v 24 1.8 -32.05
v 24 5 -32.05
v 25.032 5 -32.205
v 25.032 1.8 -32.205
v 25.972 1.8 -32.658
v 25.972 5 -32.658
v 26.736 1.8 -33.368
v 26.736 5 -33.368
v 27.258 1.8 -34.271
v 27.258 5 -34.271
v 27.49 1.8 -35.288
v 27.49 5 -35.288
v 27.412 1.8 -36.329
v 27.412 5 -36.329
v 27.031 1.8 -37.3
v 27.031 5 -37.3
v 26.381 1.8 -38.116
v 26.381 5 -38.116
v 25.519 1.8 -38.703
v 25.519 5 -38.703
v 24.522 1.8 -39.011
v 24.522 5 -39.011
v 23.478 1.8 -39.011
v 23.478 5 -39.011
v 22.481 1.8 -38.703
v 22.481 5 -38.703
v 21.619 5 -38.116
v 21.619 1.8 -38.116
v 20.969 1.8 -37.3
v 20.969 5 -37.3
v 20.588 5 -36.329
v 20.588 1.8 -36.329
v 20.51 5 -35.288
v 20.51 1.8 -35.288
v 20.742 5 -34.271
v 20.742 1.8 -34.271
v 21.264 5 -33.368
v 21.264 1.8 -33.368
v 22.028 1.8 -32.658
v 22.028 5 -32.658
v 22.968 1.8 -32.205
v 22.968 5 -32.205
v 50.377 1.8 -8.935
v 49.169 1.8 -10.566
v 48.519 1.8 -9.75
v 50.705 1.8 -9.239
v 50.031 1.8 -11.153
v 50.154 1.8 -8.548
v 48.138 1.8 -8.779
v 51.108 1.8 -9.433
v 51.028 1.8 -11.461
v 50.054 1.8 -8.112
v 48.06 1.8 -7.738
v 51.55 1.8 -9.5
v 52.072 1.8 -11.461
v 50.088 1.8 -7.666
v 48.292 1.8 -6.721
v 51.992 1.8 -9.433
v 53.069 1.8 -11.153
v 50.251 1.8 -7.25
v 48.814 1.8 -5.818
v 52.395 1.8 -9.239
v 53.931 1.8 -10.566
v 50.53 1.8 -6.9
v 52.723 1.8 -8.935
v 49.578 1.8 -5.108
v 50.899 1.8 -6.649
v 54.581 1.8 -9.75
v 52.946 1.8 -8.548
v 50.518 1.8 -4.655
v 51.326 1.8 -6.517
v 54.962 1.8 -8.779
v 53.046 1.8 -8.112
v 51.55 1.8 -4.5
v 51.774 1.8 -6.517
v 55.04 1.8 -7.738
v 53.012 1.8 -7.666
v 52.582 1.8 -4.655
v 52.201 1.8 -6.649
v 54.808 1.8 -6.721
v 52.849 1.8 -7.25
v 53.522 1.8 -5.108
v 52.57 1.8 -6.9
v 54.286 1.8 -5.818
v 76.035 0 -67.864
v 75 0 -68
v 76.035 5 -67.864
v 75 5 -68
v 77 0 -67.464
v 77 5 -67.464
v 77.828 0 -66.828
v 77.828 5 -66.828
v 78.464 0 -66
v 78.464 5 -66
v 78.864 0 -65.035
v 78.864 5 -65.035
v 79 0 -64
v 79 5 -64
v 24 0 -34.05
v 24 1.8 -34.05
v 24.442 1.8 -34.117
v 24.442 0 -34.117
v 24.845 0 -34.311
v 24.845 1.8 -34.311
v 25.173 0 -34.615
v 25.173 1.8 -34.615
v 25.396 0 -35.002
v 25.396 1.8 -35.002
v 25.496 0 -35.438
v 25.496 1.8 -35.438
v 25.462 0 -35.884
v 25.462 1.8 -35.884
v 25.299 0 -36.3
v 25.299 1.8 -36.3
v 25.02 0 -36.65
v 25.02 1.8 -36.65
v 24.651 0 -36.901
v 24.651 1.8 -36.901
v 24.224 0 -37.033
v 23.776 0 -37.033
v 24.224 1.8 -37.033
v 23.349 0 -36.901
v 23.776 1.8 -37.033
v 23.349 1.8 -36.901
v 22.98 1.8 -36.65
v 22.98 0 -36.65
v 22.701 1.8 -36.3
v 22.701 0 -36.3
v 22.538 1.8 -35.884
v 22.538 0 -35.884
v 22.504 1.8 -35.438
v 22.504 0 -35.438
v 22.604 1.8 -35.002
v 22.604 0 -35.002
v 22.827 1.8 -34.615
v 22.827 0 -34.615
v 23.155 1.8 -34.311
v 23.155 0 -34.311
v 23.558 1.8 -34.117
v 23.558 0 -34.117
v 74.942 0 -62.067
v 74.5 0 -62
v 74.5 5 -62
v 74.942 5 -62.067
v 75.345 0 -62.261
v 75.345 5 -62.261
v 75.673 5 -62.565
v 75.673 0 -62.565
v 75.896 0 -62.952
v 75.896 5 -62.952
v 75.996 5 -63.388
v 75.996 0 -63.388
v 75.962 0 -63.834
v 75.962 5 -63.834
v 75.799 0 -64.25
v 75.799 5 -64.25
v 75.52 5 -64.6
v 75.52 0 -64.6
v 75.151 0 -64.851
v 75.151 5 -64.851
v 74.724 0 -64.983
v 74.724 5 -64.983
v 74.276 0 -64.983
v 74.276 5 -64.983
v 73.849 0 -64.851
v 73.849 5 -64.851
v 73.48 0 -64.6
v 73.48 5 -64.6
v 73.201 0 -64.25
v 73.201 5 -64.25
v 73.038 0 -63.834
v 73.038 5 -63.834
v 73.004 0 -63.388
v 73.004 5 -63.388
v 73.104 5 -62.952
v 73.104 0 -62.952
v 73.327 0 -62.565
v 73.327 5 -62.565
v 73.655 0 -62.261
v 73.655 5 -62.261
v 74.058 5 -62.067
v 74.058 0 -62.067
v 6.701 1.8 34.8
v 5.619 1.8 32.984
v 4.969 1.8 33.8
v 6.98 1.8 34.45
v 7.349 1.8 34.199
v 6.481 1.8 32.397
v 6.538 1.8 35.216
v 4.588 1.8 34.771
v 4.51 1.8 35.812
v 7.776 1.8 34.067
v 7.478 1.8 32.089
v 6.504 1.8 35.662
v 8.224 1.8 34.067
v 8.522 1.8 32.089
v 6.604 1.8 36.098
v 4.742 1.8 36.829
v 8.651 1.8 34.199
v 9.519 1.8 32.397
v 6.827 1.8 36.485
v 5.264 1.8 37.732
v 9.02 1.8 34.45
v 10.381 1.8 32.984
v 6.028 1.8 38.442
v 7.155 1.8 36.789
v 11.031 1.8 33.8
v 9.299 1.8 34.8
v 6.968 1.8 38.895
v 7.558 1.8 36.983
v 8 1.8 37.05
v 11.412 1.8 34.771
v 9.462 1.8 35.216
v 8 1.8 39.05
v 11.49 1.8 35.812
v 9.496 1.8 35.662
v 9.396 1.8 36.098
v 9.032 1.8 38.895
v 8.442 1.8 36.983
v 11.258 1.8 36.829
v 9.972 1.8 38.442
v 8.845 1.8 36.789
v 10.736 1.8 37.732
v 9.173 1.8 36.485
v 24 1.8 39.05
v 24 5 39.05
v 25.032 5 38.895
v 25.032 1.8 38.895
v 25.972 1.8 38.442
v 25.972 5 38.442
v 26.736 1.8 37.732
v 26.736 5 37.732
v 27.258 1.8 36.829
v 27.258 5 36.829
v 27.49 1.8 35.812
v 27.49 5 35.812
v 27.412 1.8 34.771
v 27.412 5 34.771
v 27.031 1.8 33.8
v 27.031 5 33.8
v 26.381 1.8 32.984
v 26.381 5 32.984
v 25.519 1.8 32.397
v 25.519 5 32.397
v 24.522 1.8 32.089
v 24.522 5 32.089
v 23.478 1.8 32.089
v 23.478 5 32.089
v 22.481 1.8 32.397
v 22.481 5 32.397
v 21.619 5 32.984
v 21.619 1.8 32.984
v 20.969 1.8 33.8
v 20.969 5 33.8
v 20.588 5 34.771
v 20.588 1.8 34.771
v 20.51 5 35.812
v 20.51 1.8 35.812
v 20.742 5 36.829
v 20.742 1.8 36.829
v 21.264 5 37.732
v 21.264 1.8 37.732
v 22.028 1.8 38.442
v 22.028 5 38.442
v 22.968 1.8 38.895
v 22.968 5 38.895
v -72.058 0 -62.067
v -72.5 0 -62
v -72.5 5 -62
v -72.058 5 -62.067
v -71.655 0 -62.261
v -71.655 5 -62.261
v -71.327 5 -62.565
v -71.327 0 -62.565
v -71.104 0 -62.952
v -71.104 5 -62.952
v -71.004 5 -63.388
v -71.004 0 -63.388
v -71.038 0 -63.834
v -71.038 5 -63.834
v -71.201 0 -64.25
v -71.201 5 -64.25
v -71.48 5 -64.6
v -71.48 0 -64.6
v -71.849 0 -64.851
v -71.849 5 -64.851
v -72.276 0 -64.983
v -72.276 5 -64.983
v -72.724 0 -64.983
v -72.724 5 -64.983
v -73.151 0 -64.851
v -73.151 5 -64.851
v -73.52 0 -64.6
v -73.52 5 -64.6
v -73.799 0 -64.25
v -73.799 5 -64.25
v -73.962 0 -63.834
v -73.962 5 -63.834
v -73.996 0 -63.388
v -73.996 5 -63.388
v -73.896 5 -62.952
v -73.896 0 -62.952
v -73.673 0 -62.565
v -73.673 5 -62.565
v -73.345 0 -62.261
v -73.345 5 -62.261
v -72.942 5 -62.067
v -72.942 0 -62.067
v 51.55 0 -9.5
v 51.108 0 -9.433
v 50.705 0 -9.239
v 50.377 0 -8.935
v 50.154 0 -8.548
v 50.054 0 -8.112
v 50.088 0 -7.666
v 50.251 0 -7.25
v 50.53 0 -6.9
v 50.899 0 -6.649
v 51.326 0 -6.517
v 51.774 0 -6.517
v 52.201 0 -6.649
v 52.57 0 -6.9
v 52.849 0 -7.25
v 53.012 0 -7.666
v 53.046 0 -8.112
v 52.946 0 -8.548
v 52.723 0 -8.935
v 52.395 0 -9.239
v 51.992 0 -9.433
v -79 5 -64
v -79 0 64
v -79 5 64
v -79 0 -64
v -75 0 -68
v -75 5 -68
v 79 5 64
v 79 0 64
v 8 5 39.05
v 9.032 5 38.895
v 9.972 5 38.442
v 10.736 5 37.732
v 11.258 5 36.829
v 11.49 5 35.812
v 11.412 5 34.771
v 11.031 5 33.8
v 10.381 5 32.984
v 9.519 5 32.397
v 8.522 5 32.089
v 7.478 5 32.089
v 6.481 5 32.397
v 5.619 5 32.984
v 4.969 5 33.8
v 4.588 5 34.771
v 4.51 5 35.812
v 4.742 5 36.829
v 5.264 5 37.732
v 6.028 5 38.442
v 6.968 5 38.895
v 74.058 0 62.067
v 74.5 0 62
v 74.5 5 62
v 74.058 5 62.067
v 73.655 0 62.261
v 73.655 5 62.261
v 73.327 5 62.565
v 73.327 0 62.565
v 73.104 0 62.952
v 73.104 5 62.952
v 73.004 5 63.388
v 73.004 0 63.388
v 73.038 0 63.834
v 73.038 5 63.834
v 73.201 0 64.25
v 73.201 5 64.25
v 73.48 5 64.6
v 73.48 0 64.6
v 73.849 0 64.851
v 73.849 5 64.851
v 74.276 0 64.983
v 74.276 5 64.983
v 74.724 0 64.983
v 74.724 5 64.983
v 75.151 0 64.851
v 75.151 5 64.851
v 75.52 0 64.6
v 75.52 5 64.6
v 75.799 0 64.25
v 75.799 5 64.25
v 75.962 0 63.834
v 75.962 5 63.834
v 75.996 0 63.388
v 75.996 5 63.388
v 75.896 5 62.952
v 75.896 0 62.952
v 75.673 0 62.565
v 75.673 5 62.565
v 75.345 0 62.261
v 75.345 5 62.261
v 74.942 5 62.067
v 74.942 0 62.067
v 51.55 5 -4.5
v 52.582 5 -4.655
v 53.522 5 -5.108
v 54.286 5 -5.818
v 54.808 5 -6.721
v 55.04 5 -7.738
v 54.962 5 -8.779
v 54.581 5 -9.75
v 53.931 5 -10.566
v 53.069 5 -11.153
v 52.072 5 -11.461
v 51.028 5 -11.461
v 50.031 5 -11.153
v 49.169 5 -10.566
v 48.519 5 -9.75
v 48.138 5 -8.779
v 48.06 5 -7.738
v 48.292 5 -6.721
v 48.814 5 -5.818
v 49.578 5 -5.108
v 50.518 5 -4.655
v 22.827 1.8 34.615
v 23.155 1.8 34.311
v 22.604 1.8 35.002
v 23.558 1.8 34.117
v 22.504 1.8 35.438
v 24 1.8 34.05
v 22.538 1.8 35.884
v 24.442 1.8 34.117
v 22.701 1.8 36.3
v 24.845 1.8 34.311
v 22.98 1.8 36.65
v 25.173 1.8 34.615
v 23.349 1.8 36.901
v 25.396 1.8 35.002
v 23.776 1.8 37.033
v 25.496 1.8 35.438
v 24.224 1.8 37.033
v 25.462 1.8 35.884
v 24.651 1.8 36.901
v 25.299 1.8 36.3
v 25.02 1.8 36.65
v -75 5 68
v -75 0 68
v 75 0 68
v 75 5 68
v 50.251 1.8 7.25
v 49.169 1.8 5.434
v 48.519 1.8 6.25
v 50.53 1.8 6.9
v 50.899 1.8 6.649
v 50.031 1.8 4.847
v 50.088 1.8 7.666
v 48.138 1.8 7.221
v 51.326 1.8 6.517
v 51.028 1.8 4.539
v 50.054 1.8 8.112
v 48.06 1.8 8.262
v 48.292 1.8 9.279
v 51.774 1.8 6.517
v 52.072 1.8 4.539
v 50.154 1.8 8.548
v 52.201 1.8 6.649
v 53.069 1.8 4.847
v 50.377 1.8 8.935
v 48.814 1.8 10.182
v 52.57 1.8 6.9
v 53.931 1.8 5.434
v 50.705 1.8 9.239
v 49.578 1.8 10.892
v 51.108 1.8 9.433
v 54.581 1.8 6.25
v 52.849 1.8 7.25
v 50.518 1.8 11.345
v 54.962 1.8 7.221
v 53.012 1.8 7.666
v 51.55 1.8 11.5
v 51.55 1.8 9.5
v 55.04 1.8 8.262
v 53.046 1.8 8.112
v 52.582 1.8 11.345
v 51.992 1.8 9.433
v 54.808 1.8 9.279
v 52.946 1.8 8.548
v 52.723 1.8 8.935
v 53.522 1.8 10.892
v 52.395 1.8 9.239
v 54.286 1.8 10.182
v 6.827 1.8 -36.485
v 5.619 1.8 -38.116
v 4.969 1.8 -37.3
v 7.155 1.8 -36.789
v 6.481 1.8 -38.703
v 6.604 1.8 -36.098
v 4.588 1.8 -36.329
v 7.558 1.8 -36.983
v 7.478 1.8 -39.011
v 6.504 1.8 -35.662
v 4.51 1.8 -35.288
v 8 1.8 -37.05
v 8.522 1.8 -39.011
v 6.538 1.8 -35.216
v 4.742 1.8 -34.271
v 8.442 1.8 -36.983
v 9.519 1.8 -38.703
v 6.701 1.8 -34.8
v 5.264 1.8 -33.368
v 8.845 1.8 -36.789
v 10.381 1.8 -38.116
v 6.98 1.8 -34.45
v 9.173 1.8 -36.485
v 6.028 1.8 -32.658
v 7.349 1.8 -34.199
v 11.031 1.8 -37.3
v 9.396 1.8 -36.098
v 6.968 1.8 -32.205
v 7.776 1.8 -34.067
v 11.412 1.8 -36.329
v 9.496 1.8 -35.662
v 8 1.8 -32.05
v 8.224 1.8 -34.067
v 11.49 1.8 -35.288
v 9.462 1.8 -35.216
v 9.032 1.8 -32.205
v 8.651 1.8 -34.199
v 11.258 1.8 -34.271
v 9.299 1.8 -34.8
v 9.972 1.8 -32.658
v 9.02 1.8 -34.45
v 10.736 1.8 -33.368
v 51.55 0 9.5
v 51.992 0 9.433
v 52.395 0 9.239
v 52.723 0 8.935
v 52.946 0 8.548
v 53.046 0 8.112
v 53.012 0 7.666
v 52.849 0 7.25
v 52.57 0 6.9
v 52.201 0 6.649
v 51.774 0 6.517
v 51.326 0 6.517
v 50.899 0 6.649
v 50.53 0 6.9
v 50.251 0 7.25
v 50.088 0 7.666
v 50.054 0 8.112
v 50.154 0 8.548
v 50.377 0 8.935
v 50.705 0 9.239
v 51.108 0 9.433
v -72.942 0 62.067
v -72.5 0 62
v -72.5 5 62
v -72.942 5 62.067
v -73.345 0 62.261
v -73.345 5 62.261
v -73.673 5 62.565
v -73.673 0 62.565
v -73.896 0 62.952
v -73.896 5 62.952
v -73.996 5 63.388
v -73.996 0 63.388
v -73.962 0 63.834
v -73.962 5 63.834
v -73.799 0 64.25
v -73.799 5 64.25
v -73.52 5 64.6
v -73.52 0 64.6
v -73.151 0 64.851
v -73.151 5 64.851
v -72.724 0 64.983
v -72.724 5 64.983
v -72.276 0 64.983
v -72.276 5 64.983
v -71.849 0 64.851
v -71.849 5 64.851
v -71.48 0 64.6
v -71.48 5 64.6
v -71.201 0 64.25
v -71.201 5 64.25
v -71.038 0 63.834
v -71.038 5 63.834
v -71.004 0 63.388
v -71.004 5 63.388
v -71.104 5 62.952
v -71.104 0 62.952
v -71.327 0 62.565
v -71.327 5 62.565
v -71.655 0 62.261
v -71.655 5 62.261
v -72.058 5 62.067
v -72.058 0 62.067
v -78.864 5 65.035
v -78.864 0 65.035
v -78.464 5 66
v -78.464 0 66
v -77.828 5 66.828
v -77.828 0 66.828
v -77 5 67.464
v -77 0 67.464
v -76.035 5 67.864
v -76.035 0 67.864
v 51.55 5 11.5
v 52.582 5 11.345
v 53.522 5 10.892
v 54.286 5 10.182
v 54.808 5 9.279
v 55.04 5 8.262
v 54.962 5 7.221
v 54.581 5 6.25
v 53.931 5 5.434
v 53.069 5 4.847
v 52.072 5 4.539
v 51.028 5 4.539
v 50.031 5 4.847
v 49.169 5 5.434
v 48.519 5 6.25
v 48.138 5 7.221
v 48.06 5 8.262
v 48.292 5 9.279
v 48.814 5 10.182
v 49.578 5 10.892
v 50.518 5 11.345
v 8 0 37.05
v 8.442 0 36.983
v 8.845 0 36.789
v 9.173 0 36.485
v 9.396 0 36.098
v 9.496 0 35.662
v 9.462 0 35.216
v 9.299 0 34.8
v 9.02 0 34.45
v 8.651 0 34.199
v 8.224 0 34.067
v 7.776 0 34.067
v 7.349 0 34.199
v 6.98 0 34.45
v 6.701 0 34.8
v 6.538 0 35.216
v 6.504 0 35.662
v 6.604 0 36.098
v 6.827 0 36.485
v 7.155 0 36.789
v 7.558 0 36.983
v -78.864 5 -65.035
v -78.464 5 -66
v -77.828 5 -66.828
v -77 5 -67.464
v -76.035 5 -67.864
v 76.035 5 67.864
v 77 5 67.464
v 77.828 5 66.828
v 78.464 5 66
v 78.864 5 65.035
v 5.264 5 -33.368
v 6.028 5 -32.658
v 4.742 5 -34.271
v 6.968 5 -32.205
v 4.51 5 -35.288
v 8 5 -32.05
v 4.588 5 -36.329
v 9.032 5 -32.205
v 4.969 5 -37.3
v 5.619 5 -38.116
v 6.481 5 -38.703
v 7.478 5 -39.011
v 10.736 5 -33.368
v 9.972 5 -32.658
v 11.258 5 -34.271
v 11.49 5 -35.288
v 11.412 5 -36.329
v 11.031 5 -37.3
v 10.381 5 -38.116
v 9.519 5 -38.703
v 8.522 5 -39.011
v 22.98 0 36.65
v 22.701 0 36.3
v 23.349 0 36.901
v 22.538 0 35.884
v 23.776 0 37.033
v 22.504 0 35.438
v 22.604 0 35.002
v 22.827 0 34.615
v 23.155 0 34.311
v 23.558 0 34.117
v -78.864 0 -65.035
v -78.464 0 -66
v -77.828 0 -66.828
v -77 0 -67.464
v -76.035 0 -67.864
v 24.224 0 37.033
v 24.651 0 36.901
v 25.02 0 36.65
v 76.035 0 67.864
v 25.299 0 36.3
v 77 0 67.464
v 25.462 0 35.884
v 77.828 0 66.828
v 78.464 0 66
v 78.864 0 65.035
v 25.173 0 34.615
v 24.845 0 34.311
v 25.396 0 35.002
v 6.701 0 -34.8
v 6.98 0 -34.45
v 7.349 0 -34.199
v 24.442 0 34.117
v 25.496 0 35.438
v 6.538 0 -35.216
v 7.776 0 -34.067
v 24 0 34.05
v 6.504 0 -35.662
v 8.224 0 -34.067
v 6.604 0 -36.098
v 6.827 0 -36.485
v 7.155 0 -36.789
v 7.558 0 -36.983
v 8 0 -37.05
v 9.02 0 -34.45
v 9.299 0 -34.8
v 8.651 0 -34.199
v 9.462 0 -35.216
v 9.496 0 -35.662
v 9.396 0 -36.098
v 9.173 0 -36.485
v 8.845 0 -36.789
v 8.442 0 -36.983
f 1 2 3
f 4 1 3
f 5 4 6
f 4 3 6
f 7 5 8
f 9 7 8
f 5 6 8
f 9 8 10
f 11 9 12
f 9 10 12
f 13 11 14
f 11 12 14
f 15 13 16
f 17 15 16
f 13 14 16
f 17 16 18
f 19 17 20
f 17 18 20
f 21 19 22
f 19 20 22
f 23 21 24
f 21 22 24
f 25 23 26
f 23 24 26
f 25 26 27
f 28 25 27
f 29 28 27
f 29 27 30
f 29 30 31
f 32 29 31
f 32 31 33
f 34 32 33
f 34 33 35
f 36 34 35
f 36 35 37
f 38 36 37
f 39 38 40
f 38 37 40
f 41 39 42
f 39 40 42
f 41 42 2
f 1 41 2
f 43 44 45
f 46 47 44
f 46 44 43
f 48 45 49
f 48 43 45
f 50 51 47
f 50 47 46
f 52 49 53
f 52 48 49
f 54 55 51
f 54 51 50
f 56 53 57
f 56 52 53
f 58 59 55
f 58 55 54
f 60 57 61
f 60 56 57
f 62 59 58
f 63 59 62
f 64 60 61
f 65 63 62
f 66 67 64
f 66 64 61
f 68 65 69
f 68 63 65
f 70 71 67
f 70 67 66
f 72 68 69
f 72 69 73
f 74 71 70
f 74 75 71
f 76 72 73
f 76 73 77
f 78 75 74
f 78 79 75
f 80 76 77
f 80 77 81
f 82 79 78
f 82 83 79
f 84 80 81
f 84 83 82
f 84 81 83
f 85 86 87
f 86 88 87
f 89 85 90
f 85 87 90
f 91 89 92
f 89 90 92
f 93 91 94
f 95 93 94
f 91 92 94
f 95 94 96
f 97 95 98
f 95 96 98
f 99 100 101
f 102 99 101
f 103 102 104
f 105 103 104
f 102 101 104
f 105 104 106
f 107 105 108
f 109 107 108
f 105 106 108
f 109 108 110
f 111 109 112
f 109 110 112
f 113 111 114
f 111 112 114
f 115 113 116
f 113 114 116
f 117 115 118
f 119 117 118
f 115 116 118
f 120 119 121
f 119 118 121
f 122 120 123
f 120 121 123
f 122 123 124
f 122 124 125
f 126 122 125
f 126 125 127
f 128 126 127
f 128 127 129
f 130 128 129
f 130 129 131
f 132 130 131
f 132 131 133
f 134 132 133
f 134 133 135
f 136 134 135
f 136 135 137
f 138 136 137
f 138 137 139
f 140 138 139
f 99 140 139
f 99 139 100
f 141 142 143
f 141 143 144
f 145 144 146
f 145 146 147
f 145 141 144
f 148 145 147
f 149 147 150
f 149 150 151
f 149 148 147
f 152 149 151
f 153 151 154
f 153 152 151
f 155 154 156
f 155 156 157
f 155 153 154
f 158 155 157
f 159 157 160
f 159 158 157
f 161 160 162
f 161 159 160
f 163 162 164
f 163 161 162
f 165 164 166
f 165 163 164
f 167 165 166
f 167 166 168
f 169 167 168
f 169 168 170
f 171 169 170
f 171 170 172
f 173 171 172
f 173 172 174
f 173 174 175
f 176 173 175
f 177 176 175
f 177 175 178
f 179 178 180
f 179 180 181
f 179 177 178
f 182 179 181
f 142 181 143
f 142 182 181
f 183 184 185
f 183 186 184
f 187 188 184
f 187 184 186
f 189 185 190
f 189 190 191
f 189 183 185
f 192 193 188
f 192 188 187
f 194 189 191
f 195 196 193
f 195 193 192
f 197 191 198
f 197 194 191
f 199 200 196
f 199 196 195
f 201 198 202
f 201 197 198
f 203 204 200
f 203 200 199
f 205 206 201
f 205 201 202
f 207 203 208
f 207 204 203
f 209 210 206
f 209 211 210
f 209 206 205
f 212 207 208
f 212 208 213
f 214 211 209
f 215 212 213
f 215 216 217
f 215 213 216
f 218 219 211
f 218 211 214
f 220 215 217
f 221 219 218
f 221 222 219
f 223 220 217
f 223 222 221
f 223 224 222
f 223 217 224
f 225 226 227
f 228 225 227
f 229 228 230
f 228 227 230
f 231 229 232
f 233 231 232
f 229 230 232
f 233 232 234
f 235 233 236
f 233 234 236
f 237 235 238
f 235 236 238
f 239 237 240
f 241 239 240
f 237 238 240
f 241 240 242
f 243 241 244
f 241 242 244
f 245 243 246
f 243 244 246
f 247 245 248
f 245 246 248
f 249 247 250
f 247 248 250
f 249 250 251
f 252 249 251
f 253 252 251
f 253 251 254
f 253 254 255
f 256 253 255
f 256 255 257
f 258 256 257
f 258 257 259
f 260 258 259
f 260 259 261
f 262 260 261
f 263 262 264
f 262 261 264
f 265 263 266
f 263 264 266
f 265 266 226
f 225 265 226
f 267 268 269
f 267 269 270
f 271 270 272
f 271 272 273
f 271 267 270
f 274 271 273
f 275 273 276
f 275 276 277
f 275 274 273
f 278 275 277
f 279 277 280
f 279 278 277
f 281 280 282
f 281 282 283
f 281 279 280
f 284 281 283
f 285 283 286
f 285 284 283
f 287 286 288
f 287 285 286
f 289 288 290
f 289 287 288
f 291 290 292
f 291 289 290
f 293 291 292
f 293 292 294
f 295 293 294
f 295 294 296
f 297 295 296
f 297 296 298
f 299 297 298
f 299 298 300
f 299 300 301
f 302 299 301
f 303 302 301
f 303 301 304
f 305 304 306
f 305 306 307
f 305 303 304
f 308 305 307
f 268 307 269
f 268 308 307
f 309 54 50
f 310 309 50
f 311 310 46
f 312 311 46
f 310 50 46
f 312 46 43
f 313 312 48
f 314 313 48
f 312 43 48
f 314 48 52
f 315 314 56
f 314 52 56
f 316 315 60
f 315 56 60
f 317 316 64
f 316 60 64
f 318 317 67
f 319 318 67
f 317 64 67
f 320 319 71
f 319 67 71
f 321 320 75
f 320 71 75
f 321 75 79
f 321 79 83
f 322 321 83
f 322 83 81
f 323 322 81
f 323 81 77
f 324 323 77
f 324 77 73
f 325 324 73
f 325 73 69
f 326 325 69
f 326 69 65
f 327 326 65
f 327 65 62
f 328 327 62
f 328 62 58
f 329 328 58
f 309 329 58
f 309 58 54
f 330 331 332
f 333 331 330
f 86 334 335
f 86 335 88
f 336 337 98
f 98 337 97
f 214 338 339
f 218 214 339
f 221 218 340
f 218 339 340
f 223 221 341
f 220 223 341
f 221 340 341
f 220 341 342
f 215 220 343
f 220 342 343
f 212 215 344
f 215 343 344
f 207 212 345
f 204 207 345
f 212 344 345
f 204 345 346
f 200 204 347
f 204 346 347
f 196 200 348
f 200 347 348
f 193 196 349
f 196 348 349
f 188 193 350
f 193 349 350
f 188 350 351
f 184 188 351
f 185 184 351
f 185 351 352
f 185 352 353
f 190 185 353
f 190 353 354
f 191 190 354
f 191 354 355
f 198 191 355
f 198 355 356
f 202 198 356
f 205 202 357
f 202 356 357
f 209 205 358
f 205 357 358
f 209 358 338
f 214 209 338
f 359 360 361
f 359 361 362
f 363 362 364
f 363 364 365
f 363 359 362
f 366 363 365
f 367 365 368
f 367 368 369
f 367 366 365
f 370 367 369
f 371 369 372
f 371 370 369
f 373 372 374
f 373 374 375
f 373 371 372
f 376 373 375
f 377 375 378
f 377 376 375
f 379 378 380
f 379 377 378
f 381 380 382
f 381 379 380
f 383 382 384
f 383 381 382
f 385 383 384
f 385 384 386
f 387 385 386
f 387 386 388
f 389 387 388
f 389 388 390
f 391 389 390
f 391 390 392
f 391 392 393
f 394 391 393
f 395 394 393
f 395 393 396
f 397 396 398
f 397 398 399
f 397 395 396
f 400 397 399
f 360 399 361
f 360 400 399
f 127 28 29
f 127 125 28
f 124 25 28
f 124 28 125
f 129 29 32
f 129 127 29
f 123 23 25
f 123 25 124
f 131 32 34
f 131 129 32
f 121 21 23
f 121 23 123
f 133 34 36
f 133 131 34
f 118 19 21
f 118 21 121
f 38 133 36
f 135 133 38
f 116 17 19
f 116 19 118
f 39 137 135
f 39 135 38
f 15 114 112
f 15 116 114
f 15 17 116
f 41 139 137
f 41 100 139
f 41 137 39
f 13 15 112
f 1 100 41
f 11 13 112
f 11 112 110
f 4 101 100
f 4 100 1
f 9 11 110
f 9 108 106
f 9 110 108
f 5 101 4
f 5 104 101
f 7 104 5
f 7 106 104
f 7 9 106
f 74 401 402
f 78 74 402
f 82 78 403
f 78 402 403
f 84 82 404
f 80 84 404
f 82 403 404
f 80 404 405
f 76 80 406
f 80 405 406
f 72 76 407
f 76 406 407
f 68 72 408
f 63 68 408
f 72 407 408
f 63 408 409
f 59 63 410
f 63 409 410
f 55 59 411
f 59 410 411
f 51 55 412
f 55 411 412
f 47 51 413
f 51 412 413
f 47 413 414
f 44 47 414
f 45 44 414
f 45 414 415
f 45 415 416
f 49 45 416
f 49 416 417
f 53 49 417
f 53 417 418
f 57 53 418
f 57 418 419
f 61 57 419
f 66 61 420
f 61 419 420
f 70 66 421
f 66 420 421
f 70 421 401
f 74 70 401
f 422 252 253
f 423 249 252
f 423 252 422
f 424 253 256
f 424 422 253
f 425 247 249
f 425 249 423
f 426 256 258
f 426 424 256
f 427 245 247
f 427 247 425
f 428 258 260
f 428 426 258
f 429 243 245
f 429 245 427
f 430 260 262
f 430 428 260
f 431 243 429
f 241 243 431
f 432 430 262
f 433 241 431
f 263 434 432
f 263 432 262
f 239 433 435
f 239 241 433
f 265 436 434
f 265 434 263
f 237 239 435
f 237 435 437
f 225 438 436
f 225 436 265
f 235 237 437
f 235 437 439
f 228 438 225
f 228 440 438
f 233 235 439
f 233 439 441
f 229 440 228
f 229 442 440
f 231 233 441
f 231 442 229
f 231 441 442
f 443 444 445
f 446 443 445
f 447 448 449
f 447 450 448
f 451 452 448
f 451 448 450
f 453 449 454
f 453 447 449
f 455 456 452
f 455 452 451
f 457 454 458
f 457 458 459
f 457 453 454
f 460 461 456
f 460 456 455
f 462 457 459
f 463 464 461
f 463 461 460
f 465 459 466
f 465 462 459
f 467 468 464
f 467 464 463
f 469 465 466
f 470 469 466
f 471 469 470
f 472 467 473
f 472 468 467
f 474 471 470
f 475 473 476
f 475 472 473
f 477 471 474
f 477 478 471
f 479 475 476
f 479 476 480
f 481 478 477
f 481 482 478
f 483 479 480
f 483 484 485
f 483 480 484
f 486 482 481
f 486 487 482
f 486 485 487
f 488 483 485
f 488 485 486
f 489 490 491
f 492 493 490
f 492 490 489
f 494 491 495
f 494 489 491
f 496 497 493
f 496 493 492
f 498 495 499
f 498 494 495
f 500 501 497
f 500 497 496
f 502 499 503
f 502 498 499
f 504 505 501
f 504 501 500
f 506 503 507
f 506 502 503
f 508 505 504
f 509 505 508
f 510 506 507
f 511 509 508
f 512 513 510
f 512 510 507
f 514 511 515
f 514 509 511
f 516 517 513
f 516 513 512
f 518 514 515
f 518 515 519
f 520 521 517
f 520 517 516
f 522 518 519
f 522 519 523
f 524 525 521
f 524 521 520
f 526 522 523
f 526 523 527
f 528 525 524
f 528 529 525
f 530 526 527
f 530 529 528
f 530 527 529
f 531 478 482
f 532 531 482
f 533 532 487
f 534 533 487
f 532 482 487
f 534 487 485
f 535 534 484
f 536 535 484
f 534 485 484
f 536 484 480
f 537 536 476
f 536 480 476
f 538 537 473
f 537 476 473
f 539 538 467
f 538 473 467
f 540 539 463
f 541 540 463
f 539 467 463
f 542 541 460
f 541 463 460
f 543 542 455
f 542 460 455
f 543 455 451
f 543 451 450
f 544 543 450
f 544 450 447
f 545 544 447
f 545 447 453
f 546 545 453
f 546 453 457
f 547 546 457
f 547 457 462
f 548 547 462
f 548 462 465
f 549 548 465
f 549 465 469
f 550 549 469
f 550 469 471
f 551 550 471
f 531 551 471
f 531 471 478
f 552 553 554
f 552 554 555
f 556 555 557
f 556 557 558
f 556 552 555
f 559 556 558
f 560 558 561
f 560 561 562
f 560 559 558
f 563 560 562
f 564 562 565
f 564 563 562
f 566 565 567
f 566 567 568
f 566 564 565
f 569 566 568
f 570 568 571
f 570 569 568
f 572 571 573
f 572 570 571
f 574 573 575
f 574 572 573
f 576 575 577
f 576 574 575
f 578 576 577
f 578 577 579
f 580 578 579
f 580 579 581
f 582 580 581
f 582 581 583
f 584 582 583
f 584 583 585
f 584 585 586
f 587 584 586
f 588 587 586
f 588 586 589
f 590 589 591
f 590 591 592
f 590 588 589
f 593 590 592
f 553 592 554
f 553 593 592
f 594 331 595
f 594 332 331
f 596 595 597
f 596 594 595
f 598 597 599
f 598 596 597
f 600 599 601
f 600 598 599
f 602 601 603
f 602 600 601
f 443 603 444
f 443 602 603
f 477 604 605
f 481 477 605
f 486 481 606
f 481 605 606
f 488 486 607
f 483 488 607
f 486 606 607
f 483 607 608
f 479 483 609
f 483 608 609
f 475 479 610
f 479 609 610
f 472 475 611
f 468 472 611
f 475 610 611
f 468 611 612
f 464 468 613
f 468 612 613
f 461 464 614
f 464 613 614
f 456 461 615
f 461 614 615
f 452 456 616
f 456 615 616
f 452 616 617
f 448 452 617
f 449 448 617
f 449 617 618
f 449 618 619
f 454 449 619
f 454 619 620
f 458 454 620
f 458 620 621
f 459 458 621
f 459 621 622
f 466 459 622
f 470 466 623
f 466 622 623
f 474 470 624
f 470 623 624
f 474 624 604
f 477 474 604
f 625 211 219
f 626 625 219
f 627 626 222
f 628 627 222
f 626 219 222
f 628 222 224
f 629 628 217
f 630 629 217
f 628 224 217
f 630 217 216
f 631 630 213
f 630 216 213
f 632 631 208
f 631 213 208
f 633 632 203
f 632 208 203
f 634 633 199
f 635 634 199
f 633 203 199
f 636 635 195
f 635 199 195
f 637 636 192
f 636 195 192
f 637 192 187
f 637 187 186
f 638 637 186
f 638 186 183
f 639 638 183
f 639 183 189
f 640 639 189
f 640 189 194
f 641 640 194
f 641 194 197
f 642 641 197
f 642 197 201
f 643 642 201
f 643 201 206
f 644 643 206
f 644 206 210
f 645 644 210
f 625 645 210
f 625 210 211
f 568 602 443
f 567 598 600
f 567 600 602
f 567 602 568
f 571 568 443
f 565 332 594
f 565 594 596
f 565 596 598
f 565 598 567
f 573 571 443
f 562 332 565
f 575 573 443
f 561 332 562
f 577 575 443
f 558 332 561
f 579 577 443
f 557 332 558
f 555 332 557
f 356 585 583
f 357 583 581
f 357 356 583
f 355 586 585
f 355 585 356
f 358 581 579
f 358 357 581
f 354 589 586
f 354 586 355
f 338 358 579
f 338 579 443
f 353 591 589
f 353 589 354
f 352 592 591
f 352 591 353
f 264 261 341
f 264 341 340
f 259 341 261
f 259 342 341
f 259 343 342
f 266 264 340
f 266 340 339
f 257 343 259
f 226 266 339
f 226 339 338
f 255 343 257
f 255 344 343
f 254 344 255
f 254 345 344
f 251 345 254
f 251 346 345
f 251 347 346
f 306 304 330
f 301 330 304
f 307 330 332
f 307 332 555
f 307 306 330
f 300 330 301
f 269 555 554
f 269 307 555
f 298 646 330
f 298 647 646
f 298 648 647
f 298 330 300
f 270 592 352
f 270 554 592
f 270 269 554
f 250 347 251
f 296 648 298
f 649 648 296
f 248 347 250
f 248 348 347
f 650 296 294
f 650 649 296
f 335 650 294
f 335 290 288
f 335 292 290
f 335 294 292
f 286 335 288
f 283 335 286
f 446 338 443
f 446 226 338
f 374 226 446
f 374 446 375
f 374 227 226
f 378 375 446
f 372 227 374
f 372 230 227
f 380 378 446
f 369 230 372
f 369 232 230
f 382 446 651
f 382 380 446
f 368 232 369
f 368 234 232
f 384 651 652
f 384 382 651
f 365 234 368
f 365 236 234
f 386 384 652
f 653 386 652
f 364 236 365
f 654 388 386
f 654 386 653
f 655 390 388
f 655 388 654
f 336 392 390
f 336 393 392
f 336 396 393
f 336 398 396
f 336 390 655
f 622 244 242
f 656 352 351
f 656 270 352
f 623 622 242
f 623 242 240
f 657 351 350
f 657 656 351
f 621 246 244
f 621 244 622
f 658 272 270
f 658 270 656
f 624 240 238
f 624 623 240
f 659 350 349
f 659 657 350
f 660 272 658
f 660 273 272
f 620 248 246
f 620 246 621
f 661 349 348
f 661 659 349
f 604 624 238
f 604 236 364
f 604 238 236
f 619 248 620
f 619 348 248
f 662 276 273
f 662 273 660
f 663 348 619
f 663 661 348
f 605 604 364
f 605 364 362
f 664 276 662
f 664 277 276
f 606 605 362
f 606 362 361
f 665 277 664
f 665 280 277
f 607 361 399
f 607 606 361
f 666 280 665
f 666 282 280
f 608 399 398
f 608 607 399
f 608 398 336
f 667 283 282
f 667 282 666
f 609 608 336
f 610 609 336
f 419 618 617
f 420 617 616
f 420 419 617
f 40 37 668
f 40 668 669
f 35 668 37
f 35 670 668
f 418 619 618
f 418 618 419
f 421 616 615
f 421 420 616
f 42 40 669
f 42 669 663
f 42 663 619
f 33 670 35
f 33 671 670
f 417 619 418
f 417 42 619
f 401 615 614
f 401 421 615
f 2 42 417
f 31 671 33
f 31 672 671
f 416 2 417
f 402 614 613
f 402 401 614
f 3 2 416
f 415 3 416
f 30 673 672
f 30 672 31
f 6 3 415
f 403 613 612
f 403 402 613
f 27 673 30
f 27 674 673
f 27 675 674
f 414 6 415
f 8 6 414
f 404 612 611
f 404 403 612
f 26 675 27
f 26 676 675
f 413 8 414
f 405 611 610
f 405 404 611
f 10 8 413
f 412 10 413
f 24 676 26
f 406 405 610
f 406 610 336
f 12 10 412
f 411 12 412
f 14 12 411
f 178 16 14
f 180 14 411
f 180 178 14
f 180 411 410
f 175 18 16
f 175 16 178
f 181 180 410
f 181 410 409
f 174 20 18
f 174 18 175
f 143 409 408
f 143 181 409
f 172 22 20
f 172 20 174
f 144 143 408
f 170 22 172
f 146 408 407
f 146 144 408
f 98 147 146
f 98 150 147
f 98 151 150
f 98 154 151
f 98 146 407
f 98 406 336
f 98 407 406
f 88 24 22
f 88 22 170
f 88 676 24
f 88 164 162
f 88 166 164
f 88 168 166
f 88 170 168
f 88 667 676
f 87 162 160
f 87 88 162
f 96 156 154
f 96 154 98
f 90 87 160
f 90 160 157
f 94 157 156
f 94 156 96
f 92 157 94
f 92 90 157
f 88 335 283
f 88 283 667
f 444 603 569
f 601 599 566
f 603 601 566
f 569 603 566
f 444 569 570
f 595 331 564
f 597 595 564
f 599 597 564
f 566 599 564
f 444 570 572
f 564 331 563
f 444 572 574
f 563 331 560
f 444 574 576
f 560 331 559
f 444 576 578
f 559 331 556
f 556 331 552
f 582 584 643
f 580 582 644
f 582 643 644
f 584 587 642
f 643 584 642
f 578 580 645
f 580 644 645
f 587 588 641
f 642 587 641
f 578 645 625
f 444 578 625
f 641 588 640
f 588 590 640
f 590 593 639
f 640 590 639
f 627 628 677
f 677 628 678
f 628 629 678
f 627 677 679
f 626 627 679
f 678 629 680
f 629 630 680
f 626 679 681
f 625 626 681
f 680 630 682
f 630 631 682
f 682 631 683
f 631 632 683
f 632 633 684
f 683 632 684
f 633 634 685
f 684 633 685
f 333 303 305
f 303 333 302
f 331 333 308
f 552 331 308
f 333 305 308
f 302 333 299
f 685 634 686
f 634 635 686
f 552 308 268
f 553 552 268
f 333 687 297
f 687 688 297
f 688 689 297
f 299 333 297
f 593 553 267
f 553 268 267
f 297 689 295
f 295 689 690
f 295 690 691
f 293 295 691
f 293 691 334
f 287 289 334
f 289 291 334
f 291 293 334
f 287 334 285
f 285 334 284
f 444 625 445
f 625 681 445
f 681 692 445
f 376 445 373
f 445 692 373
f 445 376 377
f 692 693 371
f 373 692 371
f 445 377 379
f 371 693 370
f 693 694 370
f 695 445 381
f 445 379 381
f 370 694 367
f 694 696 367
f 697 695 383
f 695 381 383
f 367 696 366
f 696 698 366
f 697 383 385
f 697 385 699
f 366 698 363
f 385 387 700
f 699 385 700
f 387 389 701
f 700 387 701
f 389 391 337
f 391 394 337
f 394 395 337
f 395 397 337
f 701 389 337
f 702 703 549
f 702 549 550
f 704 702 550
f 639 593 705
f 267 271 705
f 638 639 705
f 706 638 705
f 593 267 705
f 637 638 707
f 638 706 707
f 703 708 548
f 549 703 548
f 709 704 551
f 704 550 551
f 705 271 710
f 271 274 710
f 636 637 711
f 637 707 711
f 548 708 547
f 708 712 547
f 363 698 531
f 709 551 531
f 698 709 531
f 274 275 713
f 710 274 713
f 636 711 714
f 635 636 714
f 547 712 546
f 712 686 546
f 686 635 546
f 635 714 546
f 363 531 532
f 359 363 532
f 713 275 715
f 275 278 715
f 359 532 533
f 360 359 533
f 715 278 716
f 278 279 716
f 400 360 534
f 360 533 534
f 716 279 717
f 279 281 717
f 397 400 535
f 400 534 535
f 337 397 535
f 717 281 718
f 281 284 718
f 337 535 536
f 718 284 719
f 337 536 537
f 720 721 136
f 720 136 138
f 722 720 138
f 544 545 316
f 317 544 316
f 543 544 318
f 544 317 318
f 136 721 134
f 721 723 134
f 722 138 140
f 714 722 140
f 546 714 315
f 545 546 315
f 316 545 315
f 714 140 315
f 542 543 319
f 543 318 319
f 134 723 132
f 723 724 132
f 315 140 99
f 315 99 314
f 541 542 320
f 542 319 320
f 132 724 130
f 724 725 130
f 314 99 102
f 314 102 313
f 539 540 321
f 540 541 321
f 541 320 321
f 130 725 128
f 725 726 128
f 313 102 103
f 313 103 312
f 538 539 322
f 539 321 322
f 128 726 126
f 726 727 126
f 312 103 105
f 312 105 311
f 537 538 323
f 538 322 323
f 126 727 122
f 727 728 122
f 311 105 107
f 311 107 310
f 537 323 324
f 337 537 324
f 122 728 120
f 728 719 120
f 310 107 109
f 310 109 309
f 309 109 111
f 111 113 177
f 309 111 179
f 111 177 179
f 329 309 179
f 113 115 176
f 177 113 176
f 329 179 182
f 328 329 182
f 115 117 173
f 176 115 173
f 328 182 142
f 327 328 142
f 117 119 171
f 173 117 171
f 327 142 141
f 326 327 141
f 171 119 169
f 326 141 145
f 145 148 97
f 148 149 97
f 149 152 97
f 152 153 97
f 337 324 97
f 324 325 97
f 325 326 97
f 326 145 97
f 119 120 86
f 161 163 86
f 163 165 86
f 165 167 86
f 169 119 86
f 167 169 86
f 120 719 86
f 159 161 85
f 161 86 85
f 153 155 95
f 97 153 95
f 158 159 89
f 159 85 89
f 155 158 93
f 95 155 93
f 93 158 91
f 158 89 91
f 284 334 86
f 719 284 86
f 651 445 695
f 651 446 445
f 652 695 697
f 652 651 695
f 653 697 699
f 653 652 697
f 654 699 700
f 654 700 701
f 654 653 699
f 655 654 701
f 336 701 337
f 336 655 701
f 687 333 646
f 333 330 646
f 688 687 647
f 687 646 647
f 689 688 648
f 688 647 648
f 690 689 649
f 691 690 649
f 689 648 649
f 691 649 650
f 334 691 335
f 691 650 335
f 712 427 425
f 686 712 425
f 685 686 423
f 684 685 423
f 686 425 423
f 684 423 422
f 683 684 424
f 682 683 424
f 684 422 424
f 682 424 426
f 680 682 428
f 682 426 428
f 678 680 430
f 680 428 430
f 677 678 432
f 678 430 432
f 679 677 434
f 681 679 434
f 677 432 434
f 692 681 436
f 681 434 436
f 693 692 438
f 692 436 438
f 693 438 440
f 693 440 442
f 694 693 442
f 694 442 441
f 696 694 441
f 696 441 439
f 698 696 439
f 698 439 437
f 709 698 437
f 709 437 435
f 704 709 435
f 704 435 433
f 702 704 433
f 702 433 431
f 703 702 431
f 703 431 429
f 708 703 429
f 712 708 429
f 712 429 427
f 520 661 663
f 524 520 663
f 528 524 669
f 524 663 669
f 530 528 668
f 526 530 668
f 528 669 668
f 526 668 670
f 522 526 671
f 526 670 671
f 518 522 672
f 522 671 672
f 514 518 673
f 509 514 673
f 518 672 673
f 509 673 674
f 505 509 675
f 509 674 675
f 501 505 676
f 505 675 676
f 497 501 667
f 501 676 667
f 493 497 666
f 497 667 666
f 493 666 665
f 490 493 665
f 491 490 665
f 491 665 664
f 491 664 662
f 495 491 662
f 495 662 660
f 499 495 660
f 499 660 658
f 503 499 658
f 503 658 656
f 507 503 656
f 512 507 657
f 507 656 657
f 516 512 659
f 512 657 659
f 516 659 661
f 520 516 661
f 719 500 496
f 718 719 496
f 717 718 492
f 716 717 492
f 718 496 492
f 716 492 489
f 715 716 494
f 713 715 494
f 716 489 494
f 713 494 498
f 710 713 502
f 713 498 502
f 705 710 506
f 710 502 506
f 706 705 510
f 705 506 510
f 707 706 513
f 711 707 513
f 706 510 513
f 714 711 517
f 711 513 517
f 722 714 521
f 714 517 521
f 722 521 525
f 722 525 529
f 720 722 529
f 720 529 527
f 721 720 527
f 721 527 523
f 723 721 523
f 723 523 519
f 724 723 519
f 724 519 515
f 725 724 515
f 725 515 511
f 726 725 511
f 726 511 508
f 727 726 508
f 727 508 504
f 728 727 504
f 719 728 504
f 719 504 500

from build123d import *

# Parameters (mm, degrees)
SKETCH8_W           = 158
SKETCH8_H           = 136
SKETCH8_R           = 1.5
BOSS_EXTRUDE4_DEPTH = 5
FILLET2_R           = 4
SKETCH10_R          = 1.5
CUT_EXTRUDE5_DEPTH  = 5
SKETCH11_R          = 3.5
CUT_EXTRUDE6_DEPTH  = 3.2


with BuildPart() as part:
    # Sketch8 → Boss-Extrude4 (new body)
    with BuildSketch(Plane(origin=(0, 0, 0), x_dir=(1, 0, 0), z_dir=(0, 1, 0))):
        Rectangle(SKETCH8_W, SKETCH8_H)
        with Locations(Location((74.5, 63.5, 0), (0, 0, 270))):
            Circle(SKETCH8_R, mode=Mode.SUBTRACT)
        with Locations(Location((-72.5, 63.5, 0), (0, 0, 270))):
            Circle(SKETCH8_R, mode=Mode.SUBTRACT)
        with Locations(Location((-72.5, -63.5, 0), (0, 0, 90))):
            Circle(SKETCH8_R, mode=Mode.SUBTRACT)
        with Locations(Location((74.5, -63.5, 0), (0, 0, 90))):
            Circle(SKETCH8_R, mode=Mode.SUBTRACT)
    extrude(amount=BOSS_EXTRUDE4_DEPTH)

    # Fillet2
    fillet2_edges = [part.edges().sort_by_distance(p)[0] for p in [
        (79, 2.5, 68),
        (-79, 2.5, 68),
        (-79, 2.5, -68),
        (79, 2.5, -68),
    ]]
    fillet(fillet2_edges, radius=FILLET2_R)

    # Sketch10 → Cut-Extrude5 (cut)
    with BuildSketch(Plane(origin=(0, 5, 0), x_dir=(1, 0, 0), z_dir=(0, 1, 0))):
        with Locations(Location((24, 35.55, 0), (0, 0, 270))):
            Circle(SKETCH10_R)
        with Locations(Location((24, -35.55, 0), (0, 0, 90))):
            Circle(SKETCH10_R)
        with Locations(Location((8, -35.55, 0), (0, 0, 270))):
            Circle(SKETCH10_R)
        with Locations(Location((8, 35.55, 0), (0, 0, 90))):
            Circle(SKETCH10_R)
        with Locations(Location((51.55, -8, 0), (0, 0, 270))):
            Circle(SKETCH10_R)
        with Locations(Location((51.55, 8, 0), (0, 0, 90))):
            Circle(SKETCH10_R)
    extrude(amount=-CUT_EXTRUDE5_DEPTH, mode=Mode.SUBTRACT)

    # Sketch11 → Cut-Extrude6 (cut)
    with BuildSketch(Plane(origin=(0, 5, 0), x_dir=(1, 0, 0), z_dir=(0, 1, 0))):
        with Locations(Location((24, 35.55, 0), (0, 0, 270))):
            Circle(SKETCH11_R)
        with Locations(Location((8, 35.55, 0), (0, 0, 270))):
            Circle(SKETCH11_R)
        with Locations(Location((51.55, 8, 0), (0, 0, 270))):
            Circle(SKETCH11_R)
        with Locations(Location((51.55, -8, 0), (0, 0, 270))):
            Circle(SKETCH11_R)
        with Locations(Location((24, -35.55, 0), (0, 0, 270))):
            Circle(SKETCH11_R)
        with Locations(Location((8, -35.55, 0), (0, 0, 270))):
            Circle(SKETCH11_R)
    extrude(amount=-CUT_EXTRUDE6_DEPTH, mode=Mode.SUBTRACT)


solid = part.part
